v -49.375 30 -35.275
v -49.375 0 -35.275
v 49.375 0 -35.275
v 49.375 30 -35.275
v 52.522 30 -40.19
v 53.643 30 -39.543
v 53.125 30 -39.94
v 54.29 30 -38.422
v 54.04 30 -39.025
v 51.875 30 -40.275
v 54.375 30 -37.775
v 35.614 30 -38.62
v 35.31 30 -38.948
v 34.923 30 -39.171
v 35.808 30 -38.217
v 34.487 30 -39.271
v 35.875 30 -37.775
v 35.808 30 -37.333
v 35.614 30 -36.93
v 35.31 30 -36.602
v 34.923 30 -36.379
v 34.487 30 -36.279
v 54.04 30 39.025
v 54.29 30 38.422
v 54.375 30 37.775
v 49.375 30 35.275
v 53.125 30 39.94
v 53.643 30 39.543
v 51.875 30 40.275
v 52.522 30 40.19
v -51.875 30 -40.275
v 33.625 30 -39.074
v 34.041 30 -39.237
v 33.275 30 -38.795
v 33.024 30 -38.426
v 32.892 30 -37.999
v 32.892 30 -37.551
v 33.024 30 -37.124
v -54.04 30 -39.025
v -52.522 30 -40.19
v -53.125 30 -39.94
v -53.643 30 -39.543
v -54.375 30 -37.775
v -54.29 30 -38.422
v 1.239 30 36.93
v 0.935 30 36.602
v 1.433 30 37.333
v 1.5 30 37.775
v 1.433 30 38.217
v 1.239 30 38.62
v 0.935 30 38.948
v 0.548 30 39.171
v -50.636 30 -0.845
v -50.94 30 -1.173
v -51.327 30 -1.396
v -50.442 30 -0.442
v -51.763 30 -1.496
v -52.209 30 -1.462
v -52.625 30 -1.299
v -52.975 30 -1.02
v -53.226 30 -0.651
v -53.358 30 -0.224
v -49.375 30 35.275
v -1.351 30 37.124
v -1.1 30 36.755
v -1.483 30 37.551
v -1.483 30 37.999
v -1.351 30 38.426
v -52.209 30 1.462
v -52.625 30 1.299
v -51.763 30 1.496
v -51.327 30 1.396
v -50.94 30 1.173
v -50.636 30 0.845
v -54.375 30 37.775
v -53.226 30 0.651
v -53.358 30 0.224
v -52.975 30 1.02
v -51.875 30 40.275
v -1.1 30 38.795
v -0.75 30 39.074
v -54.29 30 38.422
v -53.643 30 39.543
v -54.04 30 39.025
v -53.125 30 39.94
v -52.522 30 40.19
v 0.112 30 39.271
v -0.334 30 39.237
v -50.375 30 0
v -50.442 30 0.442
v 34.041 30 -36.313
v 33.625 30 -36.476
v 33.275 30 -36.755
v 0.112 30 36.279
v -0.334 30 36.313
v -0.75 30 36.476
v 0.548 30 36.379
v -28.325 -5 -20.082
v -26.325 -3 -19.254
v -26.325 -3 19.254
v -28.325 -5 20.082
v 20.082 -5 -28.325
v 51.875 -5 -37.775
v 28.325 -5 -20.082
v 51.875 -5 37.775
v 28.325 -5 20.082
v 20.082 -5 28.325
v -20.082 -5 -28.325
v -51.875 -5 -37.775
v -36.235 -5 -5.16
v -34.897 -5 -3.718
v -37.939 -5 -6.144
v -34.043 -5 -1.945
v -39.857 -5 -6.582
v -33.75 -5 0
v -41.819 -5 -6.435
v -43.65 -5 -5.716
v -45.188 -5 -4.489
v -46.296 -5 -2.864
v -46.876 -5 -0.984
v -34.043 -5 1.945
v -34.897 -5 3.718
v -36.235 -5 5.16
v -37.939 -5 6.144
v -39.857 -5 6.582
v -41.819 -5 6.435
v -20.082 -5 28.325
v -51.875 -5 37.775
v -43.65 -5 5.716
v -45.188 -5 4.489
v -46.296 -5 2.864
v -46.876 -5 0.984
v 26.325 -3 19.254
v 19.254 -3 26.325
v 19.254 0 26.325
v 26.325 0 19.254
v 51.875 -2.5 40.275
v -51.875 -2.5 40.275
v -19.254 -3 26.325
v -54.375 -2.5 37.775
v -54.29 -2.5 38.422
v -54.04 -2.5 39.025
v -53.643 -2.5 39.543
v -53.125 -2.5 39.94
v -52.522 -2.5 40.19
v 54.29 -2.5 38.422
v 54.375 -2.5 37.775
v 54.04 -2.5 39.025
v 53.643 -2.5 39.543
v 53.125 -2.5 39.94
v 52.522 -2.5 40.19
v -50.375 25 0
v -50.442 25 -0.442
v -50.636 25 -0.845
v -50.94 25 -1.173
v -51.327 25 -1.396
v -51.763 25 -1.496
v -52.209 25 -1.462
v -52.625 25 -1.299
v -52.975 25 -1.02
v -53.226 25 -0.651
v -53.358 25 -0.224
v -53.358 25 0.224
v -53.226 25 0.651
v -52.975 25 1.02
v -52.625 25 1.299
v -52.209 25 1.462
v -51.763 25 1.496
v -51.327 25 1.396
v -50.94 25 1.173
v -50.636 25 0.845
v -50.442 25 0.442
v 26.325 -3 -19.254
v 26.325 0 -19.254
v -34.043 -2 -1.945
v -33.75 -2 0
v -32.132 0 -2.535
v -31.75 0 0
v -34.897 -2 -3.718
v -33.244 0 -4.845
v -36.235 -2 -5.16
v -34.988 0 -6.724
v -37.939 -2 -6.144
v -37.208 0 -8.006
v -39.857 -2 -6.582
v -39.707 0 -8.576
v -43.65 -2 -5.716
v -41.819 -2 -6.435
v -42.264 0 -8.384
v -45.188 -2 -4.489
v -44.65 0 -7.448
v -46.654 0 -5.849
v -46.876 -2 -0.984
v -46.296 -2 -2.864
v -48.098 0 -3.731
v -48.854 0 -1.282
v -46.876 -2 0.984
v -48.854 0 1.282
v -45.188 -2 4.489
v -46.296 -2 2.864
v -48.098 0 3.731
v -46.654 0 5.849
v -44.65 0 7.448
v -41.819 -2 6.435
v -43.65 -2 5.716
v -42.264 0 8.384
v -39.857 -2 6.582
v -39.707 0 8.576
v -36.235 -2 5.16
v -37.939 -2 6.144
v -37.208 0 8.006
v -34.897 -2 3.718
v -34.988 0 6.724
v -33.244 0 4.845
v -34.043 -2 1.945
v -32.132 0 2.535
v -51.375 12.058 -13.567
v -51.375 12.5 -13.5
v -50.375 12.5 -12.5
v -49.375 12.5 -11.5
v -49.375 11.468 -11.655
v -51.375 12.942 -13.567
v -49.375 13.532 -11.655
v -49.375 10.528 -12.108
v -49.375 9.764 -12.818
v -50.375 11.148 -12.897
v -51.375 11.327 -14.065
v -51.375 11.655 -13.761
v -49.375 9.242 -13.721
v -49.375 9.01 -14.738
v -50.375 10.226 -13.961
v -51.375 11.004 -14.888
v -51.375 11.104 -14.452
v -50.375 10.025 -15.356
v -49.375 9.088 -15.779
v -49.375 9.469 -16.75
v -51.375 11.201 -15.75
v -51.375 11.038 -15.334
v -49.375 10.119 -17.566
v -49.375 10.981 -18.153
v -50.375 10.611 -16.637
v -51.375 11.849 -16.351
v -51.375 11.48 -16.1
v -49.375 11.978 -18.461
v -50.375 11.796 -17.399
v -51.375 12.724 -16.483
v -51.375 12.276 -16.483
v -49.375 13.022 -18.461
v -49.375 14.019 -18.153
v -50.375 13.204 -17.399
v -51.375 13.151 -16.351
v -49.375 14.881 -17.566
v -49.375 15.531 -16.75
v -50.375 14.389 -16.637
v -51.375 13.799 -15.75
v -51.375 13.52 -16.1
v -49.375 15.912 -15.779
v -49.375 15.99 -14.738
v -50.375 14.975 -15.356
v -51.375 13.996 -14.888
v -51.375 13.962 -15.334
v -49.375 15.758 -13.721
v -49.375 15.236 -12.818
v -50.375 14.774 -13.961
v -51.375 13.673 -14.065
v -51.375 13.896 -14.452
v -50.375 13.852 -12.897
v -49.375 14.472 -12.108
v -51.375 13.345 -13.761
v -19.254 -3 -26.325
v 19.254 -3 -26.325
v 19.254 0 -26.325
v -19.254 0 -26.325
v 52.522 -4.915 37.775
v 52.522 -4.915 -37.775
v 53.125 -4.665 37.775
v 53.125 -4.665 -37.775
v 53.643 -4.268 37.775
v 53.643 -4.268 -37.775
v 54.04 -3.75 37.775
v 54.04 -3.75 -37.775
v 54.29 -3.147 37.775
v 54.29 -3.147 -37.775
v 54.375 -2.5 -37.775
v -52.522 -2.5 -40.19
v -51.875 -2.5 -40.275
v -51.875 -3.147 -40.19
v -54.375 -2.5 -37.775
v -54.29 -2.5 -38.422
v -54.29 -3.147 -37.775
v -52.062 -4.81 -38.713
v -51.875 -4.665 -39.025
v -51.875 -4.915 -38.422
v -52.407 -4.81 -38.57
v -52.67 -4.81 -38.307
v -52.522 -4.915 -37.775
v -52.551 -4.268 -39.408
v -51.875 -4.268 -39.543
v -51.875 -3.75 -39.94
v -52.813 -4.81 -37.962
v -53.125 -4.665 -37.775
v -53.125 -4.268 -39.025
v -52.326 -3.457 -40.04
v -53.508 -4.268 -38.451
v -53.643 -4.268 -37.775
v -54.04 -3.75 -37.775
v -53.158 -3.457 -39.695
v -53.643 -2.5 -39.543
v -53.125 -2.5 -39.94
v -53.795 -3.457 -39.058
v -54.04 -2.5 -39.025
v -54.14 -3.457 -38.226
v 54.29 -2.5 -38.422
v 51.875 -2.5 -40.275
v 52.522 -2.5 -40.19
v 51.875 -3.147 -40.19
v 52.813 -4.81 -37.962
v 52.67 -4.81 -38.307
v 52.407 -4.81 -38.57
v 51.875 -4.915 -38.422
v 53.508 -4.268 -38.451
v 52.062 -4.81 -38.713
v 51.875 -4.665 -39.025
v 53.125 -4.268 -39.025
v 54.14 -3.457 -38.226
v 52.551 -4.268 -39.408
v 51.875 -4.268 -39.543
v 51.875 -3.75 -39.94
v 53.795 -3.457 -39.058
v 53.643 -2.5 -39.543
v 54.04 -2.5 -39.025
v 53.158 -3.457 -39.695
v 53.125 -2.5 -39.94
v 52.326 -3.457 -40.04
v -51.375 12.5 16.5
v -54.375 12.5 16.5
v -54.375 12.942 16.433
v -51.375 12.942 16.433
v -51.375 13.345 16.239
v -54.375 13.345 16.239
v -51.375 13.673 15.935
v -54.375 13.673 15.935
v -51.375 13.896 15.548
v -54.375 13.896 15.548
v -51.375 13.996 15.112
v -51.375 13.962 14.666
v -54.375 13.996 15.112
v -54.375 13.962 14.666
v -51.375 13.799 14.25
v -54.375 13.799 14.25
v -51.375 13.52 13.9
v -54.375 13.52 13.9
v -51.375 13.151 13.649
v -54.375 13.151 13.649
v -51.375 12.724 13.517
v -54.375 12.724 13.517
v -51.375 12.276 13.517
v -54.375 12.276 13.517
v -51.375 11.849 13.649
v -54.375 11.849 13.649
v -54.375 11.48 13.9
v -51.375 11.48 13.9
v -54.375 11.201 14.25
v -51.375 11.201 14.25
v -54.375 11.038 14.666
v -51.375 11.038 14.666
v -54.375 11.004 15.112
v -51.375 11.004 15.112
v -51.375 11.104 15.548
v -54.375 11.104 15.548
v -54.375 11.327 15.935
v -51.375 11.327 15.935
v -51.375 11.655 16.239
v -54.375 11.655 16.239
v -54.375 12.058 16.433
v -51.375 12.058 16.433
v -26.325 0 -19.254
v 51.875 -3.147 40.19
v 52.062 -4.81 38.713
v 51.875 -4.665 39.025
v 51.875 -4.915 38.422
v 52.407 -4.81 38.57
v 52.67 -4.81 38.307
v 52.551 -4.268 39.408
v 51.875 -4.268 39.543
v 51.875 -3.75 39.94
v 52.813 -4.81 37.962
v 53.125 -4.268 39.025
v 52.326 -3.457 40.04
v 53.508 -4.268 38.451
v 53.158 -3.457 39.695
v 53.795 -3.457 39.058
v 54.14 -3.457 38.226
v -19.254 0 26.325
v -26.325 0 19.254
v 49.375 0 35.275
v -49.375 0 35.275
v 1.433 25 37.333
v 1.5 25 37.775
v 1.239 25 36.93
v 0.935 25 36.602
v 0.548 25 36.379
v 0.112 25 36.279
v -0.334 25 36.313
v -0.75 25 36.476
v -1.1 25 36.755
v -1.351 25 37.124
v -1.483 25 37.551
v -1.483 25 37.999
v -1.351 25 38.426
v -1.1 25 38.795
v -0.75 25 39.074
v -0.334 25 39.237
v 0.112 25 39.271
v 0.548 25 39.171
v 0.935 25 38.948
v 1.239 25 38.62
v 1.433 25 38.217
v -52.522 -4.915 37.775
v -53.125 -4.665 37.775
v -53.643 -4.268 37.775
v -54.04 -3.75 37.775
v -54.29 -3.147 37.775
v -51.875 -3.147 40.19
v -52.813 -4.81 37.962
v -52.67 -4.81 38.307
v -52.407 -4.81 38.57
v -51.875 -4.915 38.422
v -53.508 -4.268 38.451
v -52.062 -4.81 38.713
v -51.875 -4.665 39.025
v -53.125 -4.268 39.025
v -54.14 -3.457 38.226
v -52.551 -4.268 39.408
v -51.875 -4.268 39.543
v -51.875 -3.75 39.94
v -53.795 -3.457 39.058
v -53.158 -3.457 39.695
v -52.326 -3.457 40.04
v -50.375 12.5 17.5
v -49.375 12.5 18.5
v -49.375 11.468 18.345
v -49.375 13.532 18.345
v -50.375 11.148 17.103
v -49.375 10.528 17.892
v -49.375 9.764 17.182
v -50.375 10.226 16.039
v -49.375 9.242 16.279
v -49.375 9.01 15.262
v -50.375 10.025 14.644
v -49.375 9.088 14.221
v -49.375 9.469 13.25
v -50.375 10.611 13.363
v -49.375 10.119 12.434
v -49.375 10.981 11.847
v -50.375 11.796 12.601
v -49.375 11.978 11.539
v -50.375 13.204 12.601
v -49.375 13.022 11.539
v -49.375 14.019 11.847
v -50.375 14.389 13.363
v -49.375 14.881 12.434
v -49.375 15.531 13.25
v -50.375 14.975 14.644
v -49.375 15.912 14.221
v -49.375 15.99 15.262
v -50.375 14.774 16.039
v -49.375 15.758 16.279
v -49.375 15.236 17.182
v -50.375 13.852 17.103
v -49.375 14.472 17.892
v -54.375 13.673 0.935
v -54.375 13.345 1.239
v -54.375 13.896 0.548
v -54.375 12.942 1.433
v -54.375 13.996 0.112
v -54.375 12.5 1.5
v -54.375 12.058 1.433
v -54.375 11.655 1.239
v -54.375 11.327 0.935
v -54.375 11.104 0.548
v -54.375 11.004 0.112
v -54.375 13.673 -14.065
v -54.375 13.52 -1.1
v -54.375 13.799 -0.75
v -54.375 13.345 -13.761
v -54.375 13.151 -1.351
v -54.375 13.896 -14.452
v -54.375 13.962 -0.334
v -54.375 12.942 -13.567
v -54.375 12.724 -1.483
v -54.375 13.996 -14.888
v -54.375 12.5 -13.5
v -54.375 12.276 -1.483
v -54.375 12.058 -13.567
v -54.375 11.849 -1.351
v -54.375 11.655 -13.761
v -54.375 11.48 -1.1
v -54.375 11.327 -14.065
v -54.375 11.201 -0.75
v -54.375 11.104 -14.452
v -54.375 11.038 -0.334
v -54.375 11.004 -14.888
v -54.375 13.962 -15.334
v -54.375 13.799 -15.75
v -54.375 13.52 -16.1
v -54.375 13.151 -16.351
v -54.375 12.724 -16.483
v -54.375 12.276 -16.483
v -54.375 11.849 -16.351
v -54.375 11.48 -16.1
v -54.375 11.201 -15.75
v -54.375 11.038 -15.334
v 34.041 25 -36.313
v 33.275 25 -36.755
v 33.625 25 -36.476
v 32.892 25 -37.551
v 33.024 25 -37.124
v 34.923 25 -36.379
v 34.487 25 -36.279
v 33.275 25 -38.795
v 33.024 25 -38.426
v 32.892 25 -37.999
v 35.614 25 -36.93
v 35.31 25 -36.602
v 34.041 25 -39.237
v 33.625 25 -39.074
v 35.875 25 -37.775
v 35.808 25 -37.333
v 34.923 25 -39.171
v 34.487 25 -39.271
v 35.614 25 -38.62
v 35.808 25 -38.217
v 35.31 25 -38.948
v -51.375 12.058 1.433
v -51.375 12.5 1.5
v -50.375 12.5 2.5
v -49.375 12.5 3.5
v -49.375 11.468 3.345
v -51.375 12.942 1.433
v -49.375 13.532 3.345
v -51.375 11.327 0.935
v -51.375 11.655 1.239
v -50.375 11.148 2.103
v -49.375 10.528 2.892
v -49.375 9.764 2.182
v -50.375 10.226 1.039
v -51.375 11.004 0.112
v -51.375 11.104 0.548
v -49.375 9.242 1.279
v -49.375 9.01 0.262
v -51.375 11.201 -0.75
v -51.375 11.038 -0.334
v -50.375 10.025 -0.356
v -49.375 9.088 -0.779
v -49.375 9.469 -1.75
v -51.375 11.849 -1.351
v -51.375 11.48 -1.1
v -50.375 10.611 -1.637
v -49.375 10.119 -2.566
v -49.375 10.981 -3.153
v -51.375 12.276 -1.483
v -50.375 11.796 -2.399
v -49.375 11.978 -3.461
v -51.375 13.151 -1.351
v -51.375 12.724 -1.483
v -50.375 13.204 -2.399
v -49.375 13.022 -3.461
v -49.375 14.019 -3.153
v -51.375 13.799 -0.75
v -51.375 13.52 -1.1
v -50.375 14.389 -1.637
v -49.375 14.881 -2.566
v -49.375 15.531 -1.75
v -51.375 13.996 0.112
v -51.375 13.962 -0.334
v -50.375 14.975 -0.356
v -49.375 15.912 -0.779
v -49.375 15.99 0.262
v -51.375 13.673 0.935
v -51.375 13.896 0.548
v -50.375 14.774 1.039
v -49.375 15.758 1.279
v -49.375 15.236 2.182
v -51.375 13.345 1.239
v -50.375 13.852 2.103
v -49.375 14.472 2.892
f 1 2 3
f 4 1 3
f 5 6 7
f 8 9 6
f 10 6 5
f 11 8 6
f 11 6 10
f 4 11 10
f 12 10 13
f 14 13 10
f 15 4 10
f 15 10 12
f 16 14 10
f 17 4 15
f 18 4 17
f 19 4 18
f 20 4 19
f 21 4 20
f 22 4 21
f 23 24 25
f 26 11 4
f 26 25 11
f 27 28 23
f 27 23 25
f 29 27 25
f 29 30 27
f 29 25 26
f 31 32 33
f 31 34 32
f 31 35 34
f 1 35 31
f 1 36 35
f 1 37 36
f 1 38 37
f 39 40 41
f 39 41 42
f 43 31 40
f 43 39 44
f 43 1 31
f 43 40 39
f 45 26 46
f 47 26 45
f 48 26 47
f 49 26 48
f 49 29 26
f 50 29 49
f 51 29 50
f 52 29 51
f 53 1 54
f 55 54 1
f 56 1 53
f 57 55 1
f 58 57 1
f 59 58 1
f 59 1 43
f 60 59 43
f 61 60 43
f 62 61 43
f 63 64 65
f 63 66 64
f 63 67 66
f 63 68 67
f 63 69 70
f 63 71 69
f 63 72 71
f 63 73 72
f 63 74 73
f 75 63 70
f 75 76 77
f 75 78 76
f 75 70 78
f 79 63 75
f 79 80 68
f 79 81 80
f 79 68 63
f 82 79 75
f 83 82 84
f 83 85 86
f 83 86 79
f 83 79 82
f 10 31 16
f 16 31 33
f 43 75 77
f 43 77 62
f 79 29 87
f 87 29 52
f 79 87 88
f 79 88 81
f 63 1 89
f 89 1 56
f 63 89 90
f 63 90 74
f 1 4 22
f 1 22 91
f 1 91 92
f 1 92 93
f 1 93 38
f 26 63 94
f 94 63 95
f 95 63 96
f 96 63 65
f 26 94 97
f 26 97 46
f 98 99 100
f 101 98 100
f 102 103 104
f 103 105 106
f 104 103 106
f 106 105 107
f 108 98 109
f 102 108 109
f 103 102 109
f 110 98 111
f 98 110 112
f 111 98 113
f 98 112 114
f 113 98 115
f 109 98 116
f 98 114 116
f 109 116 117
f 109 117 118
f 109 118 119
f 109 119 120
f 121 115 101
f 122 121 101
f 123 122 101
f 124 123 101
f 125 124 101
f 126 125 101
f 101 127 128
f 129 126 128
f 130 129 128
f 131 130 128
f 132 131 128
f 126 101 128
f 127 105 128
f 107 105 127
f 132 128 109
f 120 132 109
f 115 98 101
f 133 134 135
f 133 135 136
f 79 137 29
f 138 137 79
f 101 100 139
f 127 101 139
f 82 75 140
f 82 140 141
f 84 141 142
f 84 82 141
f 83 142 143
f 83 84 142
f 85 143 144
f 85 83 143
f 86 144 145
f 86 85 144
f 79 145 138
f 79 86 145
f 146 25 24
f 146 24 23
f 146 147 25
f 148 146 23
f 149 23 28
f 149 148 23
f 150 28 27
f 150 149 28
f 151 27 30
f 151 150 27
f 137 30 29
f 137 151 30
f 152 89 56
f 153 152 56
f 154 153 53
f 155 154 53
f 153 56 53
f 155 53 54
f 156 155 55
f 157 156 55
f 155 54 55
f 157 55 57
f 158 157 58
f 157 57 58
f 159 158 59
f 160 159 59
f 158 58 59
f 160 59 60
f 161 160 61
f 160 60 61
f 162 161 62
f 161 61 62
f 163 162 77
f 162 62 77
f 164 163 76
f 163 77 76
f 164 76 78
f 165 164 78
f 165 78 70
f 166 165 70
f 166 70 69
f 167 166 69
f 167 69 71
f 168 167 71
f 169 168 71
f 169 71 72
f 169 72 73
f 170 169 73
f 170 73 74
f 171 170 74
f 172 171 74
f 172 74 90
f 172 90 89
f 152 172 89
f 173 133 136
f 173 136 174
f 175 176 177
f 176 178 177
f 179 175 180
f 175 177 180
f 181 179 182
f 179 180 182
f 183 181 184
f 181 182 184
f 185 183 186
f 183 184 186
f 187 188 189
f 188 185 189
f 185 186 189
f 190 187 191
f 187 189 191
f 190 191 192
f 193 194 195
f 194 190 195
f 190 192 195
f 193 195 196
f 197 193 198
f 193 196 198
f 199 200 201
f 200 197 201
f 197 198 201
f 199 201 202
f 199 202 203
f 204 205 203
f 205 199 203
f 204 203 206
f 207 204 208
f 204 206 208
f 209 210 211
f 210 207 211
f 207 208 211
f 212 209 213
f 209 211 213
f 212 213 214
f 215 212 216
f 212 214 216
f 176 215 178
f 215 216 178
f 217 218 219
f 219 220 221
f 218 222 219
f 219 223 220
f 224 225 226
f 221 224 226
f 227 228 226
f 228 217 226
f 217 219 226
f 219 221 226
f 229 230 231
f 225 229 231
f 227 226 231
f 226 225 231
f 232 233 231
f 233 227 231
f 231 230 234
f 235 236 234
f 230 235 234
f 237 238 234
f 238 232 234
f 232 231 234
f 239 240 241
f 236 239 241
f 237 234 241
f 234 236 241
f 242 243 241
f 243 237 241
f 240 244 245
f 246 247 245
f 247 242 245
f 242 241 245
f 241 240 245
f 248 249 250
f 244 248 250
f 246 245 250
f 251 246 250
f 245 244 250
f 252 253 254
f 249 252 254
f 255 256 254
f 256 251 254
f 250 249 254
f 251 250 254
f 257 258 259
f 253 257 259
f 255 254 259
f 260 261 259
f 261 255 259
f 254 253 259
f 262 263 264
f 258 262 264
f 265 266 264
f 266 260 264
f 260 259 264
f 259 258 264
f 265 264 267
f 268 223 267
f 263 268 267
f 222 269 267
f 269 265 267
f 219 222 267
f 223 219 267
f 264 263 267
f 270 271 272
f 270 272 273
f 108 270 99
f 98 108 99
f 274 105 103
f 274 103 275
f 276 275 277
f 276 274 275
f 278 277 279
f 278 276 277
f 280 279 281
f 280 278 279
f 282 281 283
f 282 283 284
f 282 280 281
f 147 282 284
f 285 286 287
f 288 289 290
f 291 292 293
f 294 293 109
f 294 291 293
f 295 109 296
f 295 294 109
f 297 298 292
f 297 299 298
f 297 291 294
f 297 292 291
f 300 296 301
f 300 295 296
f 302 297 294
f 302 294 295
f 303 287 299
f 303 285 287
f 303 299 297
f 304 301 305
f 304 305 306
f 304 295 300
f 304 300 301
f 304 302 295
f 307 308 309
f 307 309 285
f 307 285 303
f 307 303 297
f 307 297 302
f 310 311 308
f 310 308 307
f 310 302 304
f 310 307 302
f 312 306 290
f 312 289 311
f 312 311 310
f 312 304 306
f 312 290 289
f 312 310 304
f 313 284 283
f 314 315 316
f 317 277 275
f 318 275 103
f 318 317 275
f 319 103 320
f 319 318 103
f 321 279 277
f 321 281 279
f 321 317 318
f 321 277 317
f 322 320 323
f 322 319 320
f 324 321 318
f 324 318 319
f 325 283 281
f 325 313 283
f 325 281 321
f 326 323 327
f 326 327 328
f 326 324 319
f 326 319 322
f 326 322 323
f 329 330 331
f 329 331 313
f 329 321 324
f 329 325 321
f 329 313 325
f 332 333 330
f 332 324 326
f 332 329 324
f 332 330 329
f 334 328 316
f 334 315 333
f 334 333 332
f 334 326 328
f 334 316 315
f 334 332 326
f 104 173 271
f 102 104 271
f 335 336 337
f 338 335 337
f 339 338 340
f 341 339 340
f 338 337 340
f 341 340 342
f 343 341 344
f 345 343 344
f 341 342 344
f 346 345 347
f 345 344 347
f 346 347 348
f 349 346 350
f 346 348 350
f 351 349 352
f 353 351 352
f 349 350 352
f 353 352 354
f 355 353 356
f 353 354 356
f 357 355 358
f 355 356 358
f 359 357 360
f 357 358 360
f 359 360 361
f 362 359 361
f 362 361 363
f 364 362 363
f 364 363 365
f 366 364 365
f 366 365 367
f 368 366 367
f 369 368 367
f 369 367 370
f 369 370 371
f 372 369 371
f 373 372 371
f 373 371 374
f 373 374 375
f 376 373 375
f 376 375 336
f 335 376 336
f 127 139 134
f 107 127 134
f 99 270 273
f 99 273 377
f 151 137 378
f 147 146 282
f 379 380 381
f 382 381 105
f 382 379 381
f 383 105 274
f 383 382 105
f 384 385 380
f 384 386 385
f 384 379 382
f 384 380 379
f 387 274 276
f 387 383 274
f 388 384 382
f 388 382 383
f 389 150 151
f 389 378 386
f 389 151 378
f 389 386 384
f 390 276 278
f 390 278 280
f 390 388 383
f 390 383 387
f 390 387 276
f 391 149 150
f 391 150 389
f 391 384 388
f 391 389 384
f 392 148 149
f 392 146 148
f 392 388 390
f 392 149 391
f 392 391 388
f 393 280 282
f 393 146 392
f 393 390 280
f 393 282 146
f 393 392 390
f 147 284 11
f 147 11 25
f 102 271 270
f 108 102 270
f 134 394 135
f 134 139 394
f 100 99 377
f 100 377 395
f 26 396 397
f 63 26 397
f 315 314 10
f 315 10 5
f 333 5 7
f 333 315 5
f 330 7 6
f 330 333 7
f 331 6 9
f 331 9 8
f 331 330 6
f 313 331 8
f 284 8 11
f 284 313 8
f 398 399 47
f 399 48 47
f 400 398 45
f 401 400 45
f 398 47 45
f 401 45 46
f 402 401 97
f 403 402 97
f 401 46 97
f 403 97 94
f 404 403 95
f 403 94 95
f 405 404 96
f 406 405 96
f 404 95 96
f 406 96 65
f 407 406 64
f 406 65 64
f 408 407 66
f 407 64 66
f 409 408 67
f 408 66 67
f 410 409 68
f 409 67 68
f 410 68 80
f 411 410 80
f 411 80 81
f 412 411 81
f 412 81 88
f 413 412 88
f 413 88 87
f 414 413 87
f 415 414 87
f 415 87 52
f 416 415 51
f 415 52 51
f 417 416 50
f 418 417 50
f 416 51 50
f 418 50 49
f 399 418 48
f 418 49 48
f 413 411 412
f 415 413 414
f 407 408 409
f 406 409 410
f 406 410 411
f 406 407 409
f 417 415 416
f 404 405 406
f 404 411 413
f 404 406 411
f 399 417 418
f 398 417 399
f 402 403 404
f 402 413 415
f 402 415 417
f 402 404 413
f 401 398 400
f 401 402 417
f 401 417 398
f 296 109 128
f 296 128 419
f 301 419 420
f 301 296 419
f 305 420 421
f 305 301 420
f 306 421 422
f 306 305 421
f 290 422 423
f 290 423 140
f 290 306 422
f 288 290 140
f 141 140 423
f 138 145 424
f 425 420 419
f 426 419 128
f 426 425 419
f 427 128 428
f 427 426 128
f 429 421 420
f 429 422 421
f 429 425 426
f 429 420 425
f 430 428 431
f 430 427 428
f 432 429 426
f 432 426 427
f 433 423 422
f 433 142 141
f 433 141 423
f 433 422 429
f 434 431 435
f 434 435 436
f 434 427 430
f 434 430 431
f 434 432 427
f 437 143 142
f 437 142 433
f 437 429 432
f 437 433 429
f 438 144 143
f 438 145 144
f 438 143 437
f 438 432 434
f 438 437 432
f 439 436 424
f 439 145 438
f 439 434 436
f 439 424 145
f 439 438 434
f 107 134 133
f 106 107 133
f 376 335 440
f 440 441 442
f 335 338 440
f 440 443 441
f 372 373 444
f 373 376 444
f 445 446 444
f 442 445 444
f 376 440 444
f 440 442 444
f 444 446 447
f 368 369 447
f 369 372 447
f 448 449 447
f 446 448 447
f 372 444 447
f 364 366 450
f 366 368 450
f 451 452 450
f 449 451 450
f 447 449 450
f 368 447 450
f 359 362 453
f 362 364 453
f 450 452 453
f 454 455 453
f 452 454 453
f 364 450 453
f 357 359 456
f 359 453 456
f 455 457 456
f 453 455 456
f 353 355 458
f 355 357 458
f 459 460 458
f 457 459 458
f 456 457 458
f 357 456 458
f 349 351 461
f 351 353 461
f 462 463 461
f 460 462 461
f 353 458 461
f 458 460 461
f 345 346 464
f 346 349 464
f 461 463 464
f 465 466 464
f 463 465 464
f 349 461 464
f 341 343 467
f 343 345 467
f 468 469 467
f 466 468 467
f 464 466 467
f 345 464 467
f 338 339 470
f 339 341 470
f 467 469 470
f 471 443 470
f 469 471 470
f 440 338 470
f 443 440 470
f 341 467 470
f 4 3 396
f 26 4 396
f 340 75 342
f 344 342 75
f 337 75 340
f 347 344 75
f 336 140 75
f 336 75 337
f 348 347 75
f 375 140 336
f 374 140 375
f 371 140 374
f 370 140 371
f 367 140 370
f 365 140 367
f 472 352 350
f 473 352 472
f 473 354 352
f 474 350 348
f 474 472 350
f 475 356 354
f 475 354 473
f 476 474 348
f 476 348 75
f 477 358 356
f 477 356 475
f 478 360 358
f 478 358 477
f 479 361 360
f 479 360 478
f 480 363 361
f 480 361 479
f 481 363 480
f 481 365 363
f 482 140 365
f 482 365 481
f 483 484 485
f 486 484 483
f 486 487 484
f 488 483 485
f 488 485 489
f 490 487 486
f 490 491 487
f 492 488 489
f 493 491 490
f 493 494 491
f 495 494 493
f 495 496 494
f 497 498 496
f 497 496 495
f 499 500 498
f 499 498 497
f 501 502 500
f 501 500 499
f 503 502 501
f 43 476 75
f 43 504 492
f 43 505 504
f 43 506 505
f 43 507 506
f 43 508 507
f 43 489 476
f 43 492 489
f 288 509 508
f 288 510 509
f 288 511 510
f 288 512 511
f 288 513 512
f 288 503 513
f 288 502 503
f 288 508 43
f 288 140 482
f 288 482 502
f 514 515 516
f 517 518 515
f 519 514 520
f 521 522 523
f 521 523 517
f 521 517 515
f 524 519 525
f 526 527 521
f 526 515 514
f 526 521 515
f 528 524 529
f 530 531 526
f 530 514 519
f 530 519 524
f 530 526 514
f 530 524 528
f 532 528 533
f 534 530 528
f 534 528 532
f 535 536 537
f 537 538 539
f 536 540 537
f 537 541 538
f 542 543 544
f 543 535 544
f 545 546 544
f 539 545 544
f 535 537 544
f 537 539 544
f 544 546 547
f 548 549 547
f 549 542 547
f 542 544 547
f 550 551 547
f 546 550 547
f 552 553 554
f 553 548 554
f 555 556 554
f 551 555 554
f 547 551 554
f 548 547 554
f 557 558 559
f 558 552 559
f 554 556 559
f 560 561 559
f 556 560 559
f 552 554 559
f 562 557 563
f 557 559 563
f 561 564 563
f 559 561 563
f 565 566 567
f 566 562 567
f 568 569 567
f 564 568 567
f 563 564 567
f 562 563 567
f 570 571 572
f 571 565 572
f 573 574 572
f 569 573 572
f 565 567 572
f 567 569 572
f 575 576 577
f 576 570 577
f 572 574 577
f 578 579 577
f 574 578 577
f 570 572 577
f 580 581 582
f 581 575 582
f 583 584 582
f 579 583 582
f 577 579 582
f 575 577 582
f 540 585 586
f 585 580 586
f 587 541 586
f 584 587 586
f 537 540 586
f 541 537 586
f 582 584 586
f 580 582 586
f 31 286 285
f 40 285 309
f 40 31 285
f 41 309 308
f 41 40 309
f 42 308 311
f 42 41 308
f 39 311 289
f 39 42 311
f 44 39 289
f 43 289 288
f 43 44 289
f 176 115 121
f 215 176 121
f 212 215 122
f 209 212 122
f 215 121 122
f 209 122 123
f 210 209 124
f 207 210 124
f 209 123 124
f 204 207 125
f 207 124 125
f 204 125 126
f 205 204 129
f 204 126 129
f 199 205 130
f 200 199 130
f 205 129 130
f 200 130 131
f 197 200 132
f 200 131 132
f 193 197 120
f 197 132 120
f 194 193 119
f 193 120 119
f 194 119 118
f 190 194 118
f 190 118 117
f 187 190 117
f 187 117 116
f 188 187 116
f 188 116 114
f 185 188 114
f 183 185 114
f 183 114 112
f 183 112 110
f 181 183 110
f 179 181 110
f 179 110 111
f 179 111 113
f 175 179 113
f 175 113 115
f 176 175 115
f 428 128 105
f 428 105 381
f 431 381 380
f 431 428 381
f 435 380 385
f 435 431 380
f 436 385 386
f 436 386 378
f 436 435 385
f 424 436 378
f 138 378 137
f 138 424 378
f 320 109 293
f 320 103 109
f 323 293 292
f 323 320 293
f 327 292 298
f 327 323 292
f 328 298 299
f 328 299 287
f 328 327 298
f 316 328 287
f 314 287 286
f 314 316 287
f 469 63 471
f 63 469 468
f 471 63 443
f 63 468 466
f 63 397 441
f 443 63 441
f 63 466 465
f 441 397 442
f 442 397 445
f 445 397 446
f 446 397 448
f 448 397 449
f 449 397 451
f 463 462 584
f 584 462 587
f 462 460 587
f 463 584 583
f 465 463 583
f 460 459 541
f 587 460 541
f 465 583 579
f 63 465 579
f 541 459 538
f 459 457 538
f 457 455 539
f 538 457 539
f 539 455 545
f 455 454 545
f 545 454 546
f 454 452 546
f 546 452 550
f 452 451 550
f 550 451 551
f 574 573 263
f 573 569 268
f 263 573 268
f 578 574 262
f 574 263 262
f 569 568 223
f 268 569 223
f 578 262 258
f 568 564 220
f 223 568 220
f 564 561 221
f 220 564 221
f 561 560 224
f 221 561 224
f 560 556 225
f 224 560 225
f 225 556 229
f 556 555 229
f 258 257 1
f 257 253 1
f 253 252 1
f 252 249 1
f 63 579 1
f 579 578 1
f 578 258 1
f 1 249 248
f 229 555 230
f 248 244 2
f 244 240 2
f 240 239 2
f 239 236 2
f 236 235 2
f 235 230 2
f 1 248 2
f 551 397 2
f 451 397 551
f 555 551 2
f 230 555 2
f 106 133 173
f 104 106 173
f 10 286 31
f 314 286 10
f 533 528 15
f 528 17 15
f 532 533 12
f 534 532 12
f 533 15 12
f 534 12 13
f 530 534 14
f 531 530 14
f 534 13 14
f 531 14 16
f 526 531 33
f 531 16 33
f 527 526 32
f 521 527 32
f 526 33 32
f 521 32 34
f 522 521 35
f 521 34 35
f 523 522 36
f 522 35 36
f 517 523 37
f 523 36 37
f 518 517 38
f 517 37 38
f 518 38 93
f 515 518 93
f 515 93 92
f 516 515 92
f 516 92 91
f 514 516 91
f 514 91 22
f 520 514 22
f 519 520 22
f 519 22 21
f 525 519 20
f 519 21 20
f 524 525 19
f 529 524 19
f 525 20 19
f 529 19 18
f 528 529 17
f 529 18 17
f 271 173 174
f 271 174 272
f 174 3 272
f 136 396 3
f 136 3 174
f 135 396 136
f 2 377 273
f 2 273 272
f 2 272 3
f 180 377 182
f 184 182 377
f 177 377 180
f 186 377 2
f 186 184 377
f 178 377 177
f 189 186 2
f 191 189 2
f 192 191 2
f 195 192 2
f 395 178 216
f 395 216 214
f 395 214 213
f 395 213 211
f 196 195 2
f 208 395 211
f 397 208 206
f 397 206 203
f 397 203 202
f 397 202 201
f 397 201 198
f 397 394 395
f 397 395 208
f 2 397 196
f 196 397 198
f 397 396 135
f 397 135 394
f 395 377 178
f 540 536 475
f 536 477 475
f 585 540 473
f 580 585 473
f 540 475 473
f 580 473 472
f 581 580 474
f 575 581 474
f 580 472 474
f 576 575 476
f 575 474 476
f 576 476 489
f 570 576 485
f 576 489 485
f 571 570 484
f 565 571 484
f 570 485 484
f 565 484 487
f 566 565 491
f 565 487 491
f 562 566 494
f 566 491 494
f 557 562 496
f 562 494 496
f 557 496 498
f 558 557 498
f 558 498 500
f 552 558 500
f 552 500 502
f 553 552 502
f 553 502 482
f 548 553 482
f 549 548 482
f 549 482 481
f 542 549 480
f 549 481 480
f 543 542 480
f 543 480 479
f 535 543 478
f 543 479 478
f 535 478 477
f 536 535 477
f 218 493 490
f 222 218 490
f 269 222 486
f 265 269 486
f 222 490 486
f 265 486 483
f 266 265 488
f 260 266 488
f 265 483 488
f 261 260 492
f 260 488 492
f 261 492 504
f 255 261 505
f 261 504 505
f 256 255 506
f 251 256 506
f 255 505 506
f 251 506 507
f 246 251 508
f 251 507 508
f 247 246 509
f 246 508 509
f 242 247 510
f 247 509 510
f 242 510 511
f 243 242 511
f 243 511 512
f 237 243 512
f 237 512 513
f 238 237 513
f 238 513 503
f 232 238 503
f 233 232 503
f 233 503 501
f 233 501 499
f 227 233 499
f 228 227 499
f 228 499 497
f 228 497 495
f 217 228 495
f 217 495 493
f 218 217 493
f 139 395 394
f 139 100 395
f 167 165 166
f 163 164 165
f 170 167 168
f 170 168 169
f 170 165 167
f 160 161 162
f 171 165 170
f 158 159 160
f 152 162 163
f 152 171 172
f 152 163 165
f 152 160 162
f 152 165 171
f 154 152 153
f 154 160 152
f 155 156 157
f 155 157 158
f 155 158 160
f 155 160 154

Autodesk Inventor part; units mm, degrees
ref_plane "YZ Plane" through (0, 0, 0) normal (1, 0, 0) x (0, 1, 0)
ref_plane "XZ Plane" through (0, 0, 0) normal (0, 1, 0) x (-1, 0, 0)
ref_plane "XY Plane" through (0, 0, 0) normal (0, 0, 1) x (1, 0, 0)
sketch "스케치2" plane through (0, 0, 0) normal (0, 1, 0) x (-1, 0, 0)
  line L0 (49.375, -35.275) -> (-49.375, -35.275)
  line L1 (-49.375, -35.275) -> (-49.375, 35.275)
  line L2 (-49.375, 35.275) -> (49.375, 35.275)
  line L3 (49.375, 35.275) -> (49.375, -35.275)
  line L4 (49.375, -35.275) -> (-49.375, 35.275) construction
  line L5 (-49.375, -35.275) -> (49.375, 35.275) construction
  line L6 (54.375, -40.275) -> (-54.375, -40.275)
  line L7 (-54.375, -40.275) -> (-54.375, 40.275)
  line L8 (-54.375, 40.275) -> (54.375, 40.275)
  line L9 (54.375, 40.275) -> (54.375, -40.275)
  point P0 (0, 0)
  dimension "d0" = 98.75
  dimension "d1" = 70.55
  dimension "d2" = 5
extrude "돌출1" add sketch "스케치2" along normal blind 30
sketch "스케치3" plane through (0, 0, 0) normal (0, 1, 0) x (-1, 0, 0)
  line L0 (54.375, 40.275) -> (-54.375, 40.275) construction
  line L1 (54.375, -40.275) -> (-54.375, -40.275)
  line L2 (-54.375, -40.275) -> (-54.375, 40.275)
  line L3 (-54.375, 40.275) -> (54.375, 40.275)
  line L4 (54.375, 40.275) -> (54.375, -40.275)
  line L5 (54.375, -40.275) -> (-54.375, 40.275) construction
  line L6 (-54.375, -40.275) -> (54.375, 40.275) construction
  point P0 (0, 0)
extrude "돌출2" add sketch "스케치3" against normal blind 5
sketch "스케치4" plane through (0, -5, 0) normal (0, -1, 0) x (1, 0, 0)
  line L0 (26.325, -26.325) -> (-26.325, -26.325)
  line L1 (-26.325, -26.325) -> (-26.325, 26.325)
  line L2 (-26.325, 26.325) -> (26.325, 26.325)
  line L3 (26.325, 26.325) -> (26.325, -26.325)
  line L4 (26.325, -26.325) -> (-26.325, 26.325) construction
  line L5 (-26.325, -26.325) -> (26.325, 26.325) construction
  line L6 (-26.325, 19.2539) -> (-19.2539, 26.325)
  line L7 (-19.2539, -26.325) -> (-26.325, -19.2539)
  line L8 (26.325, -19.2539) -> (19.2539, -26.325)
  line L9 (19.2539, 26.325) -> (26.325, 19.2539)
  point P0 (0, 0)
  dimension "d7" = 52.65
  dimension "d8" = 52.65
  dimension "d9" = 45
  dimension "d10" = 5
  dimension "d13" = 360
extrude "돌출3" cut sketch "스케치4" against normal through all contours L0 L7 L1 L6 L2 L9 L3 L8
sketch "스케치5" plane through (-54.375, 30, -40.275) normal (-1, 0, 0) x (0, 0, 1)
  line L0 (80.55, -35) -> (0, -35) construction
  circle A0 centre (40.275, -17.5) radius 1.5
  circle A1 centre (25.275, -17.5) radius 1.5
  circle A2 centre (55.275, -17.5) radius 1.5
  point P0 (40.275, -30)
  dimension "d17" = 3
  dimension "d18" = 17.5
  dimension "d19" = 3
  dimension "d20" = 17.5
  dimension "d21" = 17.5
  dimension "d22" = 3
  dimension "d23" = 15
  dimension "d24" = 0
  dimension "d25" = 15
extrude "돌출4" cut sketch "스케치5" against normal blind 5
fillet "모깎기1" radius 2.5 8 edges at (-54.375, 12.5, 40.275) (54.375, 12.5, 40.275) (54.375, 12.5, -40.275) (-54.375, 12.5, -40.275) (-54.375, -5, 0) (0, -5, -40.275) (0, -5, 40.275) (54.375, -5, 0)
chamfer "모따기1" distance 2 angle 45 11 edges at (-49.375, 12.5, 13.5) (-49.375, 12.5, -1.5) (-49.375, 12.5, -16.5) (0, -5, -26.325) (22.7895, -5, -22.7895) (26.325, -5, 0) (22.7895, -5, 22.7895) (0, -5, 26.325) (-22.7895, -5, 22.7895) (-26.325, -5, 0) (-22.7895, -5, -22.7895)
sketch "스케치6" plane through (0, -5, 0) normal (0, -1, 0) x (1, 0, 0)
  circle A0 centre (-40.35, 0) radius 6.6
  line L0 (-54.375, 37.775) -> (-54.375, -37.775) construction
  line L1 (-26.325, -19.2539) -> (-26.325, 19.2539) construction
  point P0 (0, 0)
  dimension "d32" = 13.2
  dimension "d33" = 14.025
  dimension "d34" = 14.025
extrude "돌출5" cut sketch "스케치6" against normal blind 5
chamfer "모따기2" distance 2 angle 45 1 edges at (-46.95, 0, 0)
sketch "스케치7" plane through (0, 30, 0) normal (0, 1, 0) x (1, 0, 0)
  line L0 (-54.375, 37.775) -> (-54.375, -37.775) construction
  line L1 (54.375, -37.775) -> (54.375, 37.775) construction
  line L2 (-49.375, 35.275) -> (49.375, 35.275) construction
  circle A0 centre (-51.875, 0) radius 1.5
  line L3 (-51.875, -37.775) -> (51.875, -37.775) construction
  circle A1 centre (0, -37.775) radius 1.5
  circle A2 centre (34.375, 37.775) radius 1.5
  point P0 (0, 0)
  dimension "d40" = 3
  dimension "d41" = 2.5
  dimension "d42" = 3
  dimension "d43" = 3
  dimension "d44" = 2.5
  dimension "d45" = 20
extrude "돌출6" cut sketch "스케치7" against normal blind 5
equation "\"d33\" = d34"
properties part number "housing_top"
